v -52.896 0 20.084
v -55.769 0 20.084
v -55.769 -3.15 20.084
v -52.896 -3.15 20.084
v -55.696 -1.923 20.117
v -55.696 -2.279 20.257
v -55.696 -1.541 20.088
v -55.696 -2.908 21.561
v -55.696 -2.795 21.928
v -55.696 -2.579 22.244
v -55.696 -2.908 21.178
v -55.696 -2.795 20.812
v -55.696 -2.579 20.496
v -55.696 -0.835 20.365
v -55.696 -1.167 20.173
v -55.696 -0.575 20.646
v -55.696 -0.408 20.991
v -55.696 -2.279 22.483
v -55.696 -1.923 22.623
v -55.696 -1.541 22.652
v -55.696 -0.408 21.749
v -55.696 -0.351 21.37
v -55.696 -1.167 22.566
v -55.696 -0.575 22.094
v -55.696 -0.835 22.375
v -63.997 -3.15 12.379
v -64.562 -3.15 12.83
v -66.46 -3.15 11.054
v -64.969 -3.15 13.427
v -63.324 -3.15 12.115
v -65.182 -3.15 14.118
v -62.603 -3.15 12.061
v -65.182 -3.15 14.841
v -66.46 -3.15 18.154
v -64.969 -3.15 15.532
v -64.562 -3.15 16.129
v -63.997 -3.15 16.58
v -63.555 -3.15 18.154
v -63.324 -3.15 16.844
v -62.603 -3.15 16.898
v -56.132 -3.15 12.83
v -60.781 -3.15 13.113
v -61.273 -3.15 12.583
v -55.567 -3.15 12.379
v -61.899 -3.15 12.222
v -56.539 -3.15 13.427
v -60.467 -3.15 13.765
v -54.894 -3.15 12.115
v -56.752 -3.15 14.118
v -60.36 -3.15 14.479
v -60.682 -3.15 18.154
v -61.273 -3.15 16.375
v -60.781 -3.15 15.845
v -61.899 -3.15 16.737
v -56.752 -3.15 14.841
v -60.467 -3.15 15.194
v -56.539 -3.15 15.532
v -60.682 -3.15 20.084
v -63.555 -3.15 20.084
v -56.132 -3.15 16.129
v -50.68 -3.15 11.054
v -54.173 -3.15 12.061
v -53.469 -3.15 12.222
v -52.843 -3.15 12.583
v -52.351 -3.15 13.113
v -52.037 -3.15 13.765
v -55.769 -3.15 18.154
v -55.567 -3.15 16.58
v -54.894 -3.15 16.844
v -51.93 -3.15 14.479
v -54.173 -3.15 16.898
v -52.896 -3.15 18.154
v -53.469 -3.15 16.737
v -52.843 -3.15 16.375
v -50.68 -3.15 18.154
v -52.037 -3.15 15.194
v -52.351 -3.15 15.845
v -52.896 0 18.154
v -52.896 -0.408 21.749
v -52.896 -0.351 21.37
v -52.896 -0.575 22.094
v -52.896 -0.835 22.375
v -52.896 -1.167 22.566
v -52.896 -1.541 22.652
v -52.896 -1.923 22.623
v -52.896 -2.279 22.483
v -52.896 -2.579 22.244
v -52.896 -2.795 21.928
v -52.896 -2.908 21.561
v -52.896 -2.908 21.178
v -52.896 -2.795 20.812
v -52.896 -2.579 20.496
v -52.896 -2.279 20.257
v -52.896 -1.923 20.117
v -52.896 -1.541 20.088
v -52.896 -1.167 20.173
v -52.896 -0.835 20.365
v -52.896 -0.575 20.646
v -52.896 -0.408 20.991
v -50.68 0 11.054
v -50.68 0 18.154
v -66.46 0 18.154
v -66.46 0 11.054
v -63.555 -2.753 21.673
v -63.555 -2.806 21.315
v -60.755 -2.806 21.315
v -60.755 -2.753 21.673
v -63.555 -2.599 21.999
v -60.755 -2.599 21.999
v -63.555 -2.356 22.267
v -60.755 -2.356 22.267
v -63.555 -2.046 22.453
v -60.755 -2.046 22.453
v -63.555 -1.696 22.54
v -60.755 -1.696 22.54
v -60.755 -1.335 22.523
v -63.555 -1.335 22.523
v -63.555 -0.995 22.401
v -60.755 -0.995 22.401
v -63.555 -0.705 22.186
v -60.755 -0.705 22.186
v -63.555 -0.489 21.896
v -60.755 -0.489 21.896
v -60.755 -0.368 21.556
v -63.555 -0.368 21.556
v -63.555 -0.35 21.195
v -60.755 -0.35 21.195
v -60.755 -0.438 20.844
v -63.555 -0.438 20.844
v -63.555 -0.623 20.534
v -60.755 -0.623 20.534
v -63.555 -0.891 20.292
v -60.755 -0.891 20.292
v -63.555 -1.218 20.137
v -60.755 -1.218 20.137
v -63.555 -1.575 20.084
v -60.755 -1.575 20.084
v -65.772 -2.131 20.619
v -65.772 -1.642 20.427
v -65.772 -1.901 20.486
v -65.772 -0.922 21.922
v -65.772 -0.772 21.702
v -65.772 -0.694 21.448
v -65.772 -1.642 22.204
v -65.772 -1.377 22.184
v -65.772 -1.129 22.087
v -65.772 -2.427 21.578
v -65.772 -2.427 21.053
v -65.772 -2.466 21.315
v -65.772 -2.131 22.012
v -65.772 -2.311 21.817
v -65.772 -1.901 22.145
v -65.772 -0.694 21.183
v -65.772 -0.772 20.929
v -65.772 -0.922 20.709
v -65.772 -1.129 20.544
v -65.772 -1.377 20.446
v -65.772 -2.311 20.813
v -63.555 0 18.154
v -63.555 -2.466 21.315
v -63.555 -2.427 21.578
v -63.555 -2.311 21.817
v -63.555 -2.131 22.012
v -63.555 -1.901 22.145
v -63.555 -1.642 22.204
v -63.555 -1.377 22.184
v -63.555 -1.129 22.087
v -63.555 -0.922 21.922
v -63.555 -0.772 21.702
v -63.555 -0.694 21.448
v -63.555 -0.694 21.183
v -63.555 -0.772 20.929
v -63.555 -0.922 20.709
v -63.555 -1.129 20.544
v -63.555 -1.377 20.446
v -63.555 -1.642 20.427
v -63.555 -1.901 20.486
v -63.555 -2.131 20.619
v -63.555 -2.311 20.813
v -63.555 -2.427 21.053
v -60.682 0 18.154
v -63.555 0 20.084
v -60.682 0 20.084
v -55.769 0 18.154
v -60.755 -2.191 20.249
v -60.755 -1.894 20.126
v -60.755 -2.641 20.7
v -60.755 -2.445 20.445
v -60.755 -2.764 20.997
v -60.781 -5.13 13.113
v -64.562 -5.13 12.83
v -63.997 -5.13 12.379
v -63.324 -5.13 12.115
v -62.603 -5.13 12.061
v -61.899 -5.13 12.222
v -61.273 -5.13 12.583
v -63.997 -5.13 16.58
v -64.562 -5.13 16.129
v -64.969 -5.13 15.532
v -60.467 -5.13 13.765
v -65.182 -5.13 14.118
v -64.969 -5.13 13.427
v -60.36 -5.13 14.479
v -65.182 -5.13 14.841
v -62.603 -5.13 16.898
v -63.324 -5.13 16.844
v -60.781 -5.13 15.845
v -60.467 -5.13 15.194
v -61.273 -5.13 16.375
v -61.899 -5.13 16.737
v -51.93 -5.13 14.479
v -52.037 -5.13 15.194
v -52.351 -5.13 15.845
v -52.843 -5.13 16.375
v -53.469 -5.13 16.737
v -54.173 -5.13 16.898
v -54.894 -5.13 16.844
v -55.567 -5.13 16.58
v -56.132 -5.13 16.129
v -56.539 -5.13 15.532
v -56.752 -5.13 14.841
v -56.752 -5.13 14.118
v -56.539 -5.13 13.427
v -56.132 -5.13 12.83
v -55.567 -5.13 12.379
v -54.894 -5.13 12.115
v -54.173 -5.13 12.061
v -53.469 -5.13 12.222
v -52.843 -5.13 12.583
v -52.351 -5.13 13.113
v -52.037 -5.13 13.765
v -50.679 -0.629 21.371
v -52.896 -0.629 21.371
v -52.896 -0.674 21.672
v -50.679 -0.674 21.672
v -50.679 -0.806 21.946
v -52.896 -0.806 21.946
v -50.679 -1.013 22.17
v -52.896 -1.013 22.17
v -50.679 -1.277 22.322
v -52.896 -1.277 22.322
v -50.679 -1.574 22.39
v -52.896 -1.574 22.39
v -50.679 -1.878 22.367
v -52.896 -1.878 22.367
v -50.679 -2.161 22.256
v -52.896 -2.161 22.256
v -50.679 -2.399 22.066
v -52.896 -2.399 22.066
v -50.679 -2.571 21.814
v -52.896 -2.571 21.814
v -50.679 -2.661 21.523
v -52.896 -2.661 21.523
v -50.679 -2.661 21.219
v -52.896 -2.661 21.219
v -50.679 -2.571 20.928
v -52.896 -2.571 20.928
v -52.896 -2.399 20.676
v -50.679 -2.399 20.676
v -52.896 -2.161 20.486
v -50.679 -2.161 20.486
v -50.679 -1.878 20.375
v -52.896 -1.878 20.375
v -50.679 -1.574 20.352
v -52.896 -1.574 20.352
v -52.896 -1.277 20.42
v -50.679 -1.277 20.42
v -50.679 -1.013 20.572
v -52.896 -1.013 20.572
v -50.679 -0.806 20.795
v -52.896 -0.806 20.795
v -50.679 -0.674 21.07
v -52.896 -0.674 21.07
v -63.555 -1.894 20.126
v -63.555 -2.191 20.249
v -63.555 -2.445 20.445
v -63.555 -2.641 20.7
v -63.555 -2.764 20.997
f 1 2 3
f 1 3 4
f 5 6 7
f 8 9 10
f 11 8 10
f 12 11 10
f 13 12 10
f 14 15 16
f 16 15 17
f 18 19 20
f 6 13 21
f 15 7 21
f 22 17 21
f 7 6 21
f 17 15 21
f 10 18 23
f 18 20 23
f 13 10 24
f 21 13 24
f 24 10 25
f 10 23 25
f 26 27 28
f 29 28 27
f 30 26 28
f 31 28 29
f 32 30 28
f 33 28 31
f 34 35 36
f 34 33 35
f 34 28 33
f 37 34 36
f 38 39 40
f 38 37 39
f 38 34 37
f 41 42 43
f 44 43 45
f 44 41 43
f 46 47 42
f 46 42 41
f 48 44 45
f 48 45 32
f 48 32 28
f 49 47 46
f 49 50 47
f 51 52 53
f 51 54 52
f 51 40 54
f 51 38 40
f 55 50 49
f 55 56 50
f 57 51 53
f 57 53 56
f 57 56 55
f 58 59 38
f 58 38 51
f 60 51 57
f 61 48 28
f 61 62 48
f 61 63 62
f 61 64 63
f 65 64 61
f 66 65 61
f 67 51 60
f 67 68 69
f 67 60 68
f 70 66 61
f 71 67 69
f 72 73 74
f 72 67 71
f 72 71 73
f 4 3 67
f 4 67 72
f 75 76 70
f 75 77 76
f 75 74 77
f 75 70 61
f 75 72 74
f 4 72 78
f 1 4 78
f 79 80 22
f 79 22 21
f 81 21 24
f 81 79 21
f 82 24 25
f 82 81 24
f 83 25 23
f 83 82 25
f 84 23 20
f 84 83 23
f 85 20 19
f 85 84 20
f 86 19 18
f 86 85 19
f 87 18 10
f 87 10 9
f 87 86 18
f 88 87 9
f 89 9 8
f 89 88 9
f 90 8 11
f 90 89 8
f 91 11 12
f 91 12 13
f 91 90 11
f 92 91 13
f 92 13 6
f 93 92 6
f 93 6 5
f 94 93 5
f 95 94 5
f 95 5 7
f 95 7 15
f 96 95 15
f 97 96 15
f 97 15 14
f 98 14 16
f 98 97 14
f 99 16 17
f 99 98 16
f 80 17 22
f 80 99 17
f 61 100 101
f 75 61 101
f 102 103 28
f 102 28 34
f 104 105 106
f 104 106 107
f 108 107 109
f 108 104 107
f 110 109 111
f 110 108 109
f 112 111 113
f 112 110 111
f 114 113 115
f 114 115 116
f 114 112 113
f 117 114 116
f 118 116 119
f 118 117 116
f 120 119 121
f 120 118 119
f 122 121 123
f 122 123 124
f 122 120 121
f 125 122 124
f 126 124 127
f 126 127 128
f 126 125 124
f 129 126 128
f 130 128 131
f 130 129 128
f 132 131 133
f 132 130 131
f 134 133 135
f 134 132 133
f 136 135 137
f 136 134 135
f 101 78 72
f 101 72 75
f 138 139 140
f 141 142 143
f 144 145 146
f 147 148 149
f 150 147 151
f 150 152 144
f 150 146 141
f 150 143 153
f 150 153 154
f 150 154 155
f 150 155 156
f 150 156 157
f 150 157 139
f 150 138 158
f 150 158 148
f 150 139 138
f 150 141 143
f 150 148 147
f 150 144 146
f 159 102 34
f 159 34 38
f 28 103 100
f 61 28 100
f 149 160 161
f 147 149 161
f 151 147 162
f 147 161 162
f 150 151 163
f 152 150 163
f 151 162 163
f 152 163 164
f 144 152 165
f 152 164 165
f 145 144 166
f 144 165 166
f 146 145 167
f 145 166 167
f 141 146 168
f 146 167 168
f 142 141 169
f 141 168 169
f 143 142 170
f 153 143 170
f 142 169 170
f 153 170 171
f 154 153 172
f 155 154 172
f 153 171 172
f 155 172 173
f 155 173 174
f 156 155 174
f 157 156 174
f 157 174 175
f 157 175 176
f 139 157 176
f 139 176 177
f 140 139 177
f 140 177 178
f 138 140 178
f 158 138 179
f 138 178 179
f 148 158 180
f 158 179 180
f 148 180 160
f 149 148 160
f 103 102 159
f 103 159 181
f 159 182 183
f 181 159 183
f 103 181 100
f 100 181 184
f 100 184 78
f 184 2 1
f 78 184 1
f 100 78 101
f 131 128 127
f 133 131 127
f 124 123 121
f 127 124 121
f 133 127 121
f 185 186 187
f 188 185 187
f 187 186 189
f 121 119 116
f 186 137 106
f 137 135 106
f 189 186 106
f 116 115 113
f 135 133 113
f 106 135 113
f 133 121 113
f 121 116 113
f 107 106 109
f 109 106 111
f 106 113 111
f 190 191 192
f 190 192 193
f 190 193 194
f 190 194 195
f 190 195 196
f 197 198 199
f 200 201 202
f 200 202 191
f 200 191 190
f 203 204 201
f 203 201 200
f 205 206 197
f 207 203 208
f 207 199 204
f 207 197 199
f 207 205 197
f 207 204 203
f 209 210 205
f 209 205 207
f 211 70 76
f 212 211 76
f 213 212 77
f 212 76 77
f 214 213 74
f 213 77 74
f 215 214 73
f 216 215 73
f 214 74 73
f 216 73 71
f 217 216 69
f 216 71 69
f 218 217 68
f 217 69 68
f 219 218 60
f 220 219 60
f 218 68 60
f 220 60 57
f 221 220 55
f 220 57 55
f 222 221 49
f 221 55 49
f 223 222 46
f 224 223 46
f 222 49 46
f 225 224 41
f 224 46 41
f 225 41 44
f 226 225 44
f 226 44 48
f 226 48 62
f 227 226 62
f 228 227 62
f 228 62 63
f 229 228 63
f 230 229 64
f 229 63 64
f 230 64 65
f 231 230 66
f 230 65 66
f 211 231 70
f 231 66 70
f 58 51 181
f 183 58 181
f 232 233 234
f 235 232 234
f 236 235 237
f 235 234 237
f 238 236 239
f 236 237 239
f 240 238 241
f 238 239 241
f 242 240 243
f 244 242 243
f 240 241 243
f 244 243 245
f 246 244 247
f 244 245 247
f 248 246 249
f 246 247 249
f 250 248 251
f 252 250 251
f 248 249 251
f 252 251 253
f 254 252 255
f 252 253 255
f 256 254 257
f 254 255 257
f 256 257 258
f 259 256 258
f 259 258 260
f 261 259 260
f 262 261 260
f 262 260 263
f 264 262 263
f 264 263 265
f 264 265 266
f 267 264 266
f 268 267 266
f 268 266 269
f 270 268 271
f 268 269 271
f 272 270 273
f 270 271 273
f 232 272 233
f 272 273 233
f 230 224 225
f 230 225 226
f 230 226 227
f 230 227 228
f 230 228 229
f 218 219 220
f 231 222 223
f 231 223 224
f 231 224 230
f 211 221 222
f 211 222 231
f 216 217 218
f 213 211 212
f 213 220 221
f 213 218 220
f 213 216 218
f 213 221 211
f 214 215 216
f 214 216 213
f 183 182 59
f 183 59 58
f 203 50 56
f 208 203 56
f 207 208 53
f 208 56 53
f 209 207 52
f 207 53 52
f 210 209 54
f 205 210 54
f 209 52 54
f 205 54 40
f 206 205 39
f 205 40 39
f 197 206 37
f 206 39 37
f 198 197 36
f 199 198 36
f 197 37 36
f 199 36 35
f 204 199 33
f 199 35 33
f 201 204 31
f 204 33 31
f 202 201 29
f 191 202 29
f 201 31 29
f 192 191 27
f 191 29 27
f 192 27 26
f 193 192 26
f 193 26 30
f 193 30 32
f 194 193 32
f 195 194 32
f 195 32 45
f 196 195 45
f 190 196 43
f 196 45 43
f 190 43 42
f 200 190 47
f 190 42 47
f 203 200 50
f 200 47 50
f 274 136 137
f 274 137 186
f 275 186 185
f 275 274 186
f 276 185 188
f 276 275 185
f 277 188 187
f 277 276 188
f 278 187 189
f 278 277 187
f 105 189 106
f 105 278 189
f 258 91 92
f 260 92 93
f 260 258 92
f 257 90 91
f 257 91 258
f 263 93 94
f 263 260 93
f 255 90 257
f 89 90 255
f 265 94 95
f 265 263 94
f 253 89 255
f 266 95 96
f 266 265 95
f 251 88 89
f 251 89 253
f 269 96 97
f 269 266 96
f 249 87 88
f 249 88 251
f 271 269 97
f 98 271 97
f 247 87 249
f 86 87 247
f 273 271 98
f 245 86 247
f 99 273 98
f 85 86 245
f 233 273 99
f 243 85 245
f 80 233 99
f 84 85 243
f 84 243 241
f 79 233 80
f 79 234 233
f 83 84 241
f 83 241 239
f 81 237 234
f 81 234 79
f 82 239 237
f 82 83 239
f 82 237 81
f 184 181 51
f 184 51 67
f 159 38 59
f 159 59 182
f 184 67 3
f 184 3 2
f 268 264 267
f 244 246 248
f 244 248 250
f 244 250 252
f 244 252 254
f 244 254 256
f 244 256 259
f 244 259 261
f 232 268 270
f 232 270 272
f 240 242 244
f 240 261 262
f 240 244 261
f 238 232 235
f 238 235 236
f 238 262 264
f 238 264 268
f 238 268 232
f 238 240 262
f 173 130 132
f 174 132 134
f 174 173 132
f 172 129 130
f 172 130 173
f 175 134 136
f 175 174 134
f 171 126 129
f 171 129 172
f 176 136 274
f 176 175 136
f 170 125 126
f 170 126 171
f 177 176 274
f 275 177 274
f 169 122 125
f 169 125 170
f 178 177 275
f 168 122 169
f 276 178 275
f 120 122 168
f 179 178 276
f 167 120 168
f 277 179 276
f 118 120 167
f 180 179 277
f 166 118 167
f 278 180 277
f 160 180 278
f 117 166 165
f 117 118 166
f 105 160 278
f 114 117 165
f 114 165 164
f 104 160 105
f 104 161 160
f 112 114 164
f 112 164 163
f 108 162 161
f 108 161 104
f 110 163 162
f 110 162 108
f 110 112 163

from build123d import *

# Parameters (mm, degrees)
F0_W      = 15.78
F0_H      = 7.1
F1_DEPTH  = 3.15
F2_R      = 2.425
F3_DEPTH  = 1.98
F4_W      = 2.872746
F4_H      = 3.15
F5_DEPTH  = 1.93
F6_R      = 1.285428
F7_DEPTH  = 2.8
F10_DEPTH = 2.8
F11_R     = 1.021818
F12_DEPTH = 2.217
F13_R     = 0.891313
F14_DEPTH = 2.217


with BuildPart() as f1:
    # F0 (on Front) → F1 (new body)
    with BuildSketch(Plane.XZ):
        with Locations((-58.569535, 14.6044)):
            Rectangle(F0_W, F0_H)
    extrude(amount=F1_DEPTH)

    # F2 (on face) → F3 (join)
    with BuildSketch(Plane.XZ.offset(3.15)):
        with Locations((-62.784535, 14.4794)):
            Circle(F2_R)
        with Locations((-54.354535, 14.4794)):
            Circle(F2_R)
    extrude(amount=F3_DEPTH)

    # F4 (on face) → F5 (join)
    with BuildSketch(Plane.XY.offset(18.1544)):
        with Locations((-62.118547, -1.575)):
            Rectangle(F4_W, F4_H)
        with Locations((-54.332679, -1.575)):
            Rectangle(F4_W, F4_H)
    extrude(amount=F5_DEPTH)


with BuildPart() as f7:
    # F6 (on face) → F7 (new body)
    with BuildSketch(Plane.YZ.offset(-52.896306)):
        with Locations((-1.636625, 21.369828)):
            Circle(F6_R)
    extrude(amount=-F7_DEPTH)

    # F11 (on face) → F12 (join)
    with BuildSketch(Plane.YZ.offset(-52.896306)):
        with Locations((-1.65032, 21.370875)):
            Circle(F11_R)
    extrude(amount=F12_DEPTH)


with BuildPart() as f10:
    # F9 (on face) → F10 (new body)
    with BuildSketch(Plane(origin=(-63.55492, 0, 0), x_dir=(0, -1, 0), z_dir=(-1, 0, 0))):
        with BuildLine():
            ThreePointArc((1.575, 20.0844), (2.445452, 20.444953), (2.806005, 21.315405))
            ThreePointArc((2.806005, 21.315405), (0.704548, 22.185857), (1.575, 20.0844))
        make_face()
    extrude(amount=-F10_DEPTH)

    # F13 (on face) → F14 (join)
    with BuildSketch(Plane(origin=(-63.55492, 0, 0), x_dir=(0, -1, 0), z_dir=(-1, 0, 0))):
        with Locations((1.575, 21.315405)):
            Circle(F13_R)
    extrude(amount=F14_DEPTH)


solid = Compound([f1.part, f7.part, f10.part])
